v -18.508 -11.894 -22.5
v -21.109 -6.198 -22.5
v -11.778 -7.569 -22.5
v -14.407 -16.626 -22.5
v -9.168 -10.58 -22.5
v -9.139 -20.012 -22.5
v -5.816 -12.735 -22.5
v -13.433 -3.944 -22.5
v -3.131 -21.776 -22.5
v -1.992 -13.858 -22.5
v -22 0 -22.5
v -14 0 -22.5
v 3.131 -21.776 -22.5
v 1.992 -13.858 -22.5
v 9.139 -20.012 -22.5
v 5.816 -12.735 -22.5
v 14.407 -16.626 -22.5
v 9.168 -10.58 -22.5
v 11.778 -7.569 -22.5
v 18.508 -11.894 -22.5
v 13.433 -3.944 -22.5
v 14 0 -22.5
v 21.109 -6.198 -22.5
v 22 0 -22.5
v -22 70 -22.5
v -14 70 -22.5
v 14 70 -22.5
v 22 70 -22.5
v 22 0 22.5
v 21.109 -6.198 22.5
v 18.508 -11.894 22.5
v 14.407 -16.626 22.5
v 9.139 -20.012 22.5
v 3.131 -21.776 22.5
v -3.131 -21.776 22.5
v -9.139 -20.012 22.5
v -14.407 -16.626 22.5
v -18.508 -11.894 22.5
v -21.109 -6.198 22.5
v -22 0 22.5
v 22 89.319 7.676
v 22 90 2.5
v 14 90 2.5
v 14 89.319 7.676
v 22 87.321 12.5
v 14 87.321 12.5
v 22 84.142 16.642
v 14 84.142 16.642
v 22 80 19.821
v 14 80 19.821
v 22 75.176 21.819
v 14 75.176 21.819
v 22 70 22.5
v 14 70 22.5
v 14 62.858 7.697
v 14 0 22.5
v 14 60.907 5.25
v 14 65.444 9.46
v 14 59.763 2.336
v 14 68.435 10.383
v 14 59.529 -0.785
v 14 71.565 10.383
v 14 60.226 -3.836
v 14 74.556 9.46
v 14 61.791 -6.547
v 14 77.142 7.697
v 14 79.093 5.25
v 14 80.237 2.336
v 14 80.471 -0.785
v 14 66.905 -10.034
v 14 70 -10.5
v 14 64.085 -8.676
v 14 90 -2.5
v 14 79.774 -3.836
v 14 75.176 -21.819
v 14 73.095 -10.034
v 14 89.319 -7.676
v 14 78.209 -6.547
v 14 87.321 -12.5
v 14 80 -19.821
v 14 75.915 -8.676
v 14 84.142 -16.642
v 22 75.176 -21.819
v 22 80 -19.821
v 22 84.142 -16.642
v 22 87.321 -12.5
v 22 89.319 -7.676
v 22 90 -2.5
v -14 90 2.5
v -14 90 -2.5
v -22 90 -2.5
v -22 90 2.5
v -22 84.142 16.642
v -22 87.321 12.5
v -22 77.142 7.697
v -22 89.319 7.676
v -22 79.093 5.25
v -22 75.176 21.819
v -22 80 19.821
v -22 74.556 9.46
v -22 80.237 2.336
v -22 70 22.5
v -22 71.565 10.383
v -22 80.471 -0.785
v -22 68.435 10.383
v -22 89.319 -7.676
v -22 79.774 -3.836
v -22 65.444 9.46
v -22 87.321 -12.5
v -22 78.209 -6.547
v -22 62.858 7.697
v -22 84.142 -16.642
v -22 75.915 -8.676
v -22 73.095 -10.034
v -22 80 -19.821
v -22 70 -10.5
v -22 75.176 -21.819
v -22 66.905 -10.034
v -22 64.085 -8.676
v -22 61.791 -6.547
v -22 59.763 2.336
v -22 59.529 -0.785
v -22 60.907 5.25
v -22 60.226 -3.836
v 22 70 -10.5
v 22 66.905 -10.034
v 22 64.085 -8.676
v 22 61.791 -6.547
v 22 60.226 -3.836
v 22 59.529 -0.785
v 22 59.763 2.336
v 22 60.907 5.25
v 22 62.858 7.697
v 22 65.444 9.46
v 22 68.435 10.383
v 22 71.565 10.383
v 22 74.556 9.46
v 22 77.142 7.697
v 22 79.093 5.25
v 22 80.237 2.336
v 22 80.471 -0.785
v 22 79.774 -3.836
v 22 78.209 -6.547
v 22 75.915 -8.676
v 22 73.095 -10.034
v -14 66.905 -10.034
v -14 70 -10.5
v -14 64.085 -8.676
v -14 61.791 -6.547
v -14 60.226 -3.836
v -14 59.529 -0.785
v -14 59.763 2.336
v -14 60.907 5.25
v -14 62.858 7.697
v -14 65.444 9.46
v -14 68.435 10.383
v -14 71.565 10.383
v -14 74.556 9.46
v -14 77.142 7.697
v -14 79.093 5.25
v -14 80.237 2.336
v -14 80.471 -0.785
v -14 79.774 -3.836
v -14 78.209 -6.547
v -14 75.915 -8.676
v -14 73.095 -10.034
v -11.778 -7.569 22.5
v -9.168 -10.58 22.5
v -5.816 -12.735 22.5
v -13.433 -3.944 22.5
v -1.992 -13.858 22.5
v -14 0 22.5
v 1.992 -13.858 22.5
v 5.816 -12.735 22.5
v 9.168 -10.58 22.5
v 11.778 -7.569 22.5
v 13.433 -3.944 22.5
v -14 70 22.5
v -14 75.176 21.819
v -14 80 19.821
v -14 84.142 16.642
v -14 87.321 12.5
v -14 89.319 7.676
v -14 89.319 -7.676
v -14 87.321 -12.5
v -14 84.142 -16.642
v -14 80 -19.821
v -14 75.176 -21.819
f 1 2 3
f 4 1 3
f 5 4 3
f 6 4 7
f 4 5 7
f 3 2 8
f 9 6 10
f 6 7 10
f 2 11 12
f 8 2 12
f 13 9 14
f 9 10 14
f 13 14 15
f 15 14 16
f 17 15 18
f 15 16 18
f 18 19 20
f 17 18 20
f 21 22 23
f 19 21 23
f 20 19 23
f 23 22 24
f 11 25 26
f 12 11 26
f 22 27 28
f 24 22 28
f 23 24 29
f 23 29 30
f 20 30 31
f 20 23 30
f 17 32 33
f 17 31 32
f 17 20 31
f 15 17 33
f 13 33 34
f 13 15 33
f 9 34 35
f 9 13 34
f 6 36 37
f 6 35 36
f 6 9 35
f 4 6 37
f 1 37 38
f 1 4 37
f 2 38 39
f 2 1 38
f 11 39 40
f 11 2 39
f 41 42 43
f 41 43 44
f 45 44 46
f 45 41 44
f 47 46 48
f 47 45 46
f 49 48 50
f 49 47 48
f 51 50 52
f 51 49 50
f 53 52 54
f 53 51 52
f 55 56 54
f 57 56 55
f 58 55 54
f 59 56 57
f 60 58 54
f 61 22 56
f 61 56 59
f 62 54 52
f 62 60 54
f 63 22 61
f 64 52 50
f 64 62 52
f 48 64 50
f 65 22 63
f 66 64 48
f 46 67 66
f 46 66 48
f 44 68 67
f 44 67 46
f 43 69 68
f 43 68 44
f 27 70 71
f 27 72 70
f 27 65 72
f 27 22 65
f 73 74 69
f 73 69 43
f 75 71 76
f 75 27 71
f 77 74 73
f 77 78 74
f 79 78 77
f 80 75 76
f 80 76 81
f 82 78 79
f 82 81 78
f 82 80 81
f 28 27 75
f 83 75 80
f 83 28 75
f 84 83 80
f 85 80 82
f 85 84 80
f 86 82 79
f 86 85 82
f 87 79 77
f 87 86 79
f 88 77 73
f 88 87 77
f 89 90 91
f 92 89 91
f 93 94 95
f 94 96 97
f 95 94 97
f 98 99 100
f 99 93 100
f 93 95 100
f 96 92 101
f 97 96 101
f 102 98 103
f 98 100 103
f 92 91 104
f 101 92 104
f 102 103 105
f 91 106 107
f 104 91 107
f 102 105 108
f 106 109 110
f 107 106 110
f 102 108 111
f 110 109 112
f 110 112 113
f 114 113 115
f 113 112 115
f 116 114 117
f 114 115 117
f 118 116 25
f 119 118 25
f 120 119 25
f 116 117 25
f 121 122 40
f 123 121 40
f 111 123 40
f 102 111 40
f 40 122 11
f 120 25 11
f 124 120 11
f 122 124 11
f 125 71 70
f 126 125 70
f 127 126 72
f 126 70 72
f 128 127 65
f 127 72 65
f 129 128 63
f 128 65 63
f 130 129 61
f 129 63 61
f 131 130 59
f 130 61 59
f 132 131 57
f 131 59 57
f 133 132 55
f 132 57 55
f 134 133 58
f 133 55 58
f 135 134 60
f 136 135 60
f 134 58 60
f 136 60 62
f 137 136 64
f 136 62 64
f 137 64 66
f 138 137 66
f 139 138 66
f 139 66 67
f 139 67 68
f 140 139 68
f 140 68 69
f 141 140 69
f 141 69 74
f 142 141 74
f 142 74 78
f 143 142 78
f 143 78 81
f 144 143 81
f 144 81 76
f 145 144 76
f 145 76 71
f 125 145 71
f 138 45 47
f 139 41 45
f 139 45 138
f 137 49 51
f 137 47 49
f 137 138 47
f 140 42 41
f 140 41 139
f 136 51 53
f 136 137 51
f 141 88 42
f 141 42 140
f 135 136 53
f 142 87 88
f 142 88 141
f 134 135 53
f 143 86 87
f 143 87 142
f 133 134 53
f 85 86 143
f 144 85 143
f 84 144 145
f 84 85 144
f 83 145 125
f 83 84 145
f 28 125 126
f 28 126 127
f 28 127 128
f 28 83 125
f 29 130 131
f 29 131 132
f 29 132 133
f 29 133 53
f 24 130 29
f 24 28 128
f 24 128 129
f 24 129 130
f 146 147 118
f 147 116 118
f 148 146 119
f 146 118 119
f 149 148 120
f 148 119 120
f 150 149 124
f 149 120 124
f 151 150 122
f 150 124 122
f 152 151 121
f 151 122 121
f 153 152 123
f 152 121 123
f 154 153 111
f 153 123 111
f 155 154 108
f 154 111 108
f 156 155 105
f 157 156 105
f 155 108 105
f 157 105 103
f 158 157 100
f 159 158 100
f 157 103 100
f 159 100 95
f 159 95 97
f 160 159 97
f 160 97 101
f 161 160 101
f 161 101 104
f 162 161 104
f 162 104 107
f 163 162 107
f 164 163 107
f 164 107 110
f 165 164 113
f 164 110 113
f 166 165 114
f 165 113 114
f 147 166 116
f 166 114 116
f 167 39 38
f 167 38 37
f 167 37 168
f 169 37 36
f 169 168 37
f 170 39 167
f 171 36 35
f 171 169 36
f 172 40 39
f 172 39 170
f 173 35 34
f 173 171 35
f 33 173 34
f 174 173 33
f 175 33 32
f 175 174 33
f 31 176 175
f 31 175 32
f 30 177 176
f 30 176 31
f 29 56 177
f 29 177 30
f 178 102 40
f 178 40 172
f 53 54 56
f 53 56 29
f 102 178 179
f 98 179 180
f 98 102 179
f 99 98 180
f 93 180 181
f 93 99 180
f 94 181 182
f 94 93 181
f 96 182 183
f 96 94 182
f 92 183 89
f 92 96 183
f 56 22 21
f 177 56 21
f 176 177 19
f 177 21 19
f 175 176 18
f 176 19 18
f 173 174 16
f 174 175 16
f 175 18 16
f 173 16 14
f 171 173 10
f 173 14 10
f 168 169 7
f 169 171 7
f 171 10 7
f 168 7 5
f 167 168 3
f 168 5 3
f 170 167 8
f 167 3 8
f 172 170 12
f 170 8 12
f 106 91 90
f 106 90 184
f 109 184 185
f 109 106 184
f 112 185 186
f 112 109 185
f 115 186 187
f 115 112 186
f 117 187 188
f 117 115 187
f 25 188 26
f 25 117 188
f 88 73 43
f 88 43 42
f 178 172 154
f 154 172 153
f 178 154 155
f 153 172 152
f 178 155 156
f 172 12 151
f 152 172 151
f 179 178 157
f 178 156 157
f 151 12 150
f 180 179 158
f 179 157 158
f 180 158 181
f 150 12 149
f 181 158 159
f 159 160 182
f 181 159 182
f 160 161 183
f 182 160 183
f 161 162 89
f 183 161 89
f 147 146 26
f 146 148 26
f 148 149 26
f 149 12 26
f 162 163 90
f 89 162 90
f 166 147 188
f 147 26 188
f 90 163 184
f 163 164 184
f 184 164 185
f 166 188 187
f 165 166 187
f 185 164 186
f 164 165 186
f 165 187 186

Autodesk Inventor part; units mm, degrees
ref_plane "YZ Plane" through (0, 0, 0) normal (1, 0, 0) x (0, 1, 0)
ref_plane "XZ Plane" through (0, 0, 0) normal (0, 1, 0) x (-1, 0, 0)
ref_plane "XY Plane" through (0, 0, 0) normal (0, 0, 1) x (1, 0, 0)
sketch "Sketch1" plane through (0, 0, 0) normal (0, 0, 1) x (1, 0, 0)
  arc A0 (-14, 0) -> (14, 0) centre (0, 0) ccw
  line L0 (-14, 0) -> (-14, 90)
  line L1 (-14, 90) -> (-22, 90)
  line L2 (-22, 90) -> (-22, 0)
  arc A1 (-22, 0) -> (22, 0) centre (0, 0) ccw
  line L3 (0, 0) -> (0, -14)
  line L4 (14, 0) -> (14, 90)
  line L5 (14, 90) -> (22, 90)
  line L6 (22, 90) -> (22, 0)
  dimension "d0" = 14
  dimension "d1" = 90
  dimension "d2" = 8
extrude "Extrusion1" add sketch "Sketch1" along normal mid plane 45
hole "Hole1" at (22, 70, 0) direction (-1, 0, 0) diameter 21 end through all
fillet "Fillet1" radius 20 4 edges at (18, 90, 22.5) (18, 90, -22.5) (-18, 90, -22.5) (-18, 90, 22.5)
properties part number "Suspension_Clamp_U-Clevis"
